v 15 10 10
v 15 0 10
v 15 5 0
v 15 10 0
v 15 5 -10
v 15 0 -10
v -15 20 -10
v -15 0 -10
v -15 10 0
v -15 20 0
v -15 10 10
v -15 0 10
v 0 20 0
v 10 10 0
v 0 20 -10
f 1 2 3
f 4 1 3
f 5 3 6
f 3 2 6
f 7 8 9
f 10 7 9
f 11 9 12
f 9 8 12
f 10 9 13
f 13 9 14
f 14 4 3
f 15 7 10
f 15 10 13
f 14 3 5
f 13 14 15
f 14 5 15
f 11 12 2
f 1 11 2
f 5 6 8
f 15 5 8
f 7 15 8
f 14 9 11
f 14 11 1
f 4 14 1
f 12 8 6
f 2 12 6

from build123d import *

# Parameters (mm, degrees)
SKETCH_1_W          = 30
SKETCH_1_H          = 20
EXTRUDE_1_DEPTH     = 10
SKETCH_1_3_W        = 30
SKETCH_1_3_H        = 10
EXTRUDE_2_DEPTH     = 20
CUT_EXTRUDE_1_DEPTH = 10


with BuildPart() as part:
    # 草圖1 → 填料-伸長1 (new body)
    with BuildSketch(Plane(origin=(0, 0, 0), x_dir=(1, 0, 0), z_dir=(0, 1, 0))):
        Rectangle(SKETCH_1_W, SKETCH_1_H)
    extrude(amount=EXTRUDE_1_DEPTH)

    # 草圖1<3> → 填料-伸長2 (add)
    with BuildSketch(Plane(origin=(0, 0, 0), x_dir=(1, 0, 0), z_dir=(0, 1, 0))):
        with Locations((0, 5)):
            Rectangle(SKETCH_1_3_W, SKETCH_1_3_H)
    extrude(amount=EXTRUDE_2_DEPTH)

    # 草圖2 → 除料-伸長1 (cut)
    with BuildSketch(Plane(origin=(0, 0, -10), x_dir=(-1, 0, 0), z_dir=(0, 0, -1))):
        Polygon((-15, 5), (0, 20), (-15, 20), align=None)
    extrude(amount=-CUT_EXTRUDE_1_DEPTH, mode=Mode.SUBTRACT)


solid = part.part
